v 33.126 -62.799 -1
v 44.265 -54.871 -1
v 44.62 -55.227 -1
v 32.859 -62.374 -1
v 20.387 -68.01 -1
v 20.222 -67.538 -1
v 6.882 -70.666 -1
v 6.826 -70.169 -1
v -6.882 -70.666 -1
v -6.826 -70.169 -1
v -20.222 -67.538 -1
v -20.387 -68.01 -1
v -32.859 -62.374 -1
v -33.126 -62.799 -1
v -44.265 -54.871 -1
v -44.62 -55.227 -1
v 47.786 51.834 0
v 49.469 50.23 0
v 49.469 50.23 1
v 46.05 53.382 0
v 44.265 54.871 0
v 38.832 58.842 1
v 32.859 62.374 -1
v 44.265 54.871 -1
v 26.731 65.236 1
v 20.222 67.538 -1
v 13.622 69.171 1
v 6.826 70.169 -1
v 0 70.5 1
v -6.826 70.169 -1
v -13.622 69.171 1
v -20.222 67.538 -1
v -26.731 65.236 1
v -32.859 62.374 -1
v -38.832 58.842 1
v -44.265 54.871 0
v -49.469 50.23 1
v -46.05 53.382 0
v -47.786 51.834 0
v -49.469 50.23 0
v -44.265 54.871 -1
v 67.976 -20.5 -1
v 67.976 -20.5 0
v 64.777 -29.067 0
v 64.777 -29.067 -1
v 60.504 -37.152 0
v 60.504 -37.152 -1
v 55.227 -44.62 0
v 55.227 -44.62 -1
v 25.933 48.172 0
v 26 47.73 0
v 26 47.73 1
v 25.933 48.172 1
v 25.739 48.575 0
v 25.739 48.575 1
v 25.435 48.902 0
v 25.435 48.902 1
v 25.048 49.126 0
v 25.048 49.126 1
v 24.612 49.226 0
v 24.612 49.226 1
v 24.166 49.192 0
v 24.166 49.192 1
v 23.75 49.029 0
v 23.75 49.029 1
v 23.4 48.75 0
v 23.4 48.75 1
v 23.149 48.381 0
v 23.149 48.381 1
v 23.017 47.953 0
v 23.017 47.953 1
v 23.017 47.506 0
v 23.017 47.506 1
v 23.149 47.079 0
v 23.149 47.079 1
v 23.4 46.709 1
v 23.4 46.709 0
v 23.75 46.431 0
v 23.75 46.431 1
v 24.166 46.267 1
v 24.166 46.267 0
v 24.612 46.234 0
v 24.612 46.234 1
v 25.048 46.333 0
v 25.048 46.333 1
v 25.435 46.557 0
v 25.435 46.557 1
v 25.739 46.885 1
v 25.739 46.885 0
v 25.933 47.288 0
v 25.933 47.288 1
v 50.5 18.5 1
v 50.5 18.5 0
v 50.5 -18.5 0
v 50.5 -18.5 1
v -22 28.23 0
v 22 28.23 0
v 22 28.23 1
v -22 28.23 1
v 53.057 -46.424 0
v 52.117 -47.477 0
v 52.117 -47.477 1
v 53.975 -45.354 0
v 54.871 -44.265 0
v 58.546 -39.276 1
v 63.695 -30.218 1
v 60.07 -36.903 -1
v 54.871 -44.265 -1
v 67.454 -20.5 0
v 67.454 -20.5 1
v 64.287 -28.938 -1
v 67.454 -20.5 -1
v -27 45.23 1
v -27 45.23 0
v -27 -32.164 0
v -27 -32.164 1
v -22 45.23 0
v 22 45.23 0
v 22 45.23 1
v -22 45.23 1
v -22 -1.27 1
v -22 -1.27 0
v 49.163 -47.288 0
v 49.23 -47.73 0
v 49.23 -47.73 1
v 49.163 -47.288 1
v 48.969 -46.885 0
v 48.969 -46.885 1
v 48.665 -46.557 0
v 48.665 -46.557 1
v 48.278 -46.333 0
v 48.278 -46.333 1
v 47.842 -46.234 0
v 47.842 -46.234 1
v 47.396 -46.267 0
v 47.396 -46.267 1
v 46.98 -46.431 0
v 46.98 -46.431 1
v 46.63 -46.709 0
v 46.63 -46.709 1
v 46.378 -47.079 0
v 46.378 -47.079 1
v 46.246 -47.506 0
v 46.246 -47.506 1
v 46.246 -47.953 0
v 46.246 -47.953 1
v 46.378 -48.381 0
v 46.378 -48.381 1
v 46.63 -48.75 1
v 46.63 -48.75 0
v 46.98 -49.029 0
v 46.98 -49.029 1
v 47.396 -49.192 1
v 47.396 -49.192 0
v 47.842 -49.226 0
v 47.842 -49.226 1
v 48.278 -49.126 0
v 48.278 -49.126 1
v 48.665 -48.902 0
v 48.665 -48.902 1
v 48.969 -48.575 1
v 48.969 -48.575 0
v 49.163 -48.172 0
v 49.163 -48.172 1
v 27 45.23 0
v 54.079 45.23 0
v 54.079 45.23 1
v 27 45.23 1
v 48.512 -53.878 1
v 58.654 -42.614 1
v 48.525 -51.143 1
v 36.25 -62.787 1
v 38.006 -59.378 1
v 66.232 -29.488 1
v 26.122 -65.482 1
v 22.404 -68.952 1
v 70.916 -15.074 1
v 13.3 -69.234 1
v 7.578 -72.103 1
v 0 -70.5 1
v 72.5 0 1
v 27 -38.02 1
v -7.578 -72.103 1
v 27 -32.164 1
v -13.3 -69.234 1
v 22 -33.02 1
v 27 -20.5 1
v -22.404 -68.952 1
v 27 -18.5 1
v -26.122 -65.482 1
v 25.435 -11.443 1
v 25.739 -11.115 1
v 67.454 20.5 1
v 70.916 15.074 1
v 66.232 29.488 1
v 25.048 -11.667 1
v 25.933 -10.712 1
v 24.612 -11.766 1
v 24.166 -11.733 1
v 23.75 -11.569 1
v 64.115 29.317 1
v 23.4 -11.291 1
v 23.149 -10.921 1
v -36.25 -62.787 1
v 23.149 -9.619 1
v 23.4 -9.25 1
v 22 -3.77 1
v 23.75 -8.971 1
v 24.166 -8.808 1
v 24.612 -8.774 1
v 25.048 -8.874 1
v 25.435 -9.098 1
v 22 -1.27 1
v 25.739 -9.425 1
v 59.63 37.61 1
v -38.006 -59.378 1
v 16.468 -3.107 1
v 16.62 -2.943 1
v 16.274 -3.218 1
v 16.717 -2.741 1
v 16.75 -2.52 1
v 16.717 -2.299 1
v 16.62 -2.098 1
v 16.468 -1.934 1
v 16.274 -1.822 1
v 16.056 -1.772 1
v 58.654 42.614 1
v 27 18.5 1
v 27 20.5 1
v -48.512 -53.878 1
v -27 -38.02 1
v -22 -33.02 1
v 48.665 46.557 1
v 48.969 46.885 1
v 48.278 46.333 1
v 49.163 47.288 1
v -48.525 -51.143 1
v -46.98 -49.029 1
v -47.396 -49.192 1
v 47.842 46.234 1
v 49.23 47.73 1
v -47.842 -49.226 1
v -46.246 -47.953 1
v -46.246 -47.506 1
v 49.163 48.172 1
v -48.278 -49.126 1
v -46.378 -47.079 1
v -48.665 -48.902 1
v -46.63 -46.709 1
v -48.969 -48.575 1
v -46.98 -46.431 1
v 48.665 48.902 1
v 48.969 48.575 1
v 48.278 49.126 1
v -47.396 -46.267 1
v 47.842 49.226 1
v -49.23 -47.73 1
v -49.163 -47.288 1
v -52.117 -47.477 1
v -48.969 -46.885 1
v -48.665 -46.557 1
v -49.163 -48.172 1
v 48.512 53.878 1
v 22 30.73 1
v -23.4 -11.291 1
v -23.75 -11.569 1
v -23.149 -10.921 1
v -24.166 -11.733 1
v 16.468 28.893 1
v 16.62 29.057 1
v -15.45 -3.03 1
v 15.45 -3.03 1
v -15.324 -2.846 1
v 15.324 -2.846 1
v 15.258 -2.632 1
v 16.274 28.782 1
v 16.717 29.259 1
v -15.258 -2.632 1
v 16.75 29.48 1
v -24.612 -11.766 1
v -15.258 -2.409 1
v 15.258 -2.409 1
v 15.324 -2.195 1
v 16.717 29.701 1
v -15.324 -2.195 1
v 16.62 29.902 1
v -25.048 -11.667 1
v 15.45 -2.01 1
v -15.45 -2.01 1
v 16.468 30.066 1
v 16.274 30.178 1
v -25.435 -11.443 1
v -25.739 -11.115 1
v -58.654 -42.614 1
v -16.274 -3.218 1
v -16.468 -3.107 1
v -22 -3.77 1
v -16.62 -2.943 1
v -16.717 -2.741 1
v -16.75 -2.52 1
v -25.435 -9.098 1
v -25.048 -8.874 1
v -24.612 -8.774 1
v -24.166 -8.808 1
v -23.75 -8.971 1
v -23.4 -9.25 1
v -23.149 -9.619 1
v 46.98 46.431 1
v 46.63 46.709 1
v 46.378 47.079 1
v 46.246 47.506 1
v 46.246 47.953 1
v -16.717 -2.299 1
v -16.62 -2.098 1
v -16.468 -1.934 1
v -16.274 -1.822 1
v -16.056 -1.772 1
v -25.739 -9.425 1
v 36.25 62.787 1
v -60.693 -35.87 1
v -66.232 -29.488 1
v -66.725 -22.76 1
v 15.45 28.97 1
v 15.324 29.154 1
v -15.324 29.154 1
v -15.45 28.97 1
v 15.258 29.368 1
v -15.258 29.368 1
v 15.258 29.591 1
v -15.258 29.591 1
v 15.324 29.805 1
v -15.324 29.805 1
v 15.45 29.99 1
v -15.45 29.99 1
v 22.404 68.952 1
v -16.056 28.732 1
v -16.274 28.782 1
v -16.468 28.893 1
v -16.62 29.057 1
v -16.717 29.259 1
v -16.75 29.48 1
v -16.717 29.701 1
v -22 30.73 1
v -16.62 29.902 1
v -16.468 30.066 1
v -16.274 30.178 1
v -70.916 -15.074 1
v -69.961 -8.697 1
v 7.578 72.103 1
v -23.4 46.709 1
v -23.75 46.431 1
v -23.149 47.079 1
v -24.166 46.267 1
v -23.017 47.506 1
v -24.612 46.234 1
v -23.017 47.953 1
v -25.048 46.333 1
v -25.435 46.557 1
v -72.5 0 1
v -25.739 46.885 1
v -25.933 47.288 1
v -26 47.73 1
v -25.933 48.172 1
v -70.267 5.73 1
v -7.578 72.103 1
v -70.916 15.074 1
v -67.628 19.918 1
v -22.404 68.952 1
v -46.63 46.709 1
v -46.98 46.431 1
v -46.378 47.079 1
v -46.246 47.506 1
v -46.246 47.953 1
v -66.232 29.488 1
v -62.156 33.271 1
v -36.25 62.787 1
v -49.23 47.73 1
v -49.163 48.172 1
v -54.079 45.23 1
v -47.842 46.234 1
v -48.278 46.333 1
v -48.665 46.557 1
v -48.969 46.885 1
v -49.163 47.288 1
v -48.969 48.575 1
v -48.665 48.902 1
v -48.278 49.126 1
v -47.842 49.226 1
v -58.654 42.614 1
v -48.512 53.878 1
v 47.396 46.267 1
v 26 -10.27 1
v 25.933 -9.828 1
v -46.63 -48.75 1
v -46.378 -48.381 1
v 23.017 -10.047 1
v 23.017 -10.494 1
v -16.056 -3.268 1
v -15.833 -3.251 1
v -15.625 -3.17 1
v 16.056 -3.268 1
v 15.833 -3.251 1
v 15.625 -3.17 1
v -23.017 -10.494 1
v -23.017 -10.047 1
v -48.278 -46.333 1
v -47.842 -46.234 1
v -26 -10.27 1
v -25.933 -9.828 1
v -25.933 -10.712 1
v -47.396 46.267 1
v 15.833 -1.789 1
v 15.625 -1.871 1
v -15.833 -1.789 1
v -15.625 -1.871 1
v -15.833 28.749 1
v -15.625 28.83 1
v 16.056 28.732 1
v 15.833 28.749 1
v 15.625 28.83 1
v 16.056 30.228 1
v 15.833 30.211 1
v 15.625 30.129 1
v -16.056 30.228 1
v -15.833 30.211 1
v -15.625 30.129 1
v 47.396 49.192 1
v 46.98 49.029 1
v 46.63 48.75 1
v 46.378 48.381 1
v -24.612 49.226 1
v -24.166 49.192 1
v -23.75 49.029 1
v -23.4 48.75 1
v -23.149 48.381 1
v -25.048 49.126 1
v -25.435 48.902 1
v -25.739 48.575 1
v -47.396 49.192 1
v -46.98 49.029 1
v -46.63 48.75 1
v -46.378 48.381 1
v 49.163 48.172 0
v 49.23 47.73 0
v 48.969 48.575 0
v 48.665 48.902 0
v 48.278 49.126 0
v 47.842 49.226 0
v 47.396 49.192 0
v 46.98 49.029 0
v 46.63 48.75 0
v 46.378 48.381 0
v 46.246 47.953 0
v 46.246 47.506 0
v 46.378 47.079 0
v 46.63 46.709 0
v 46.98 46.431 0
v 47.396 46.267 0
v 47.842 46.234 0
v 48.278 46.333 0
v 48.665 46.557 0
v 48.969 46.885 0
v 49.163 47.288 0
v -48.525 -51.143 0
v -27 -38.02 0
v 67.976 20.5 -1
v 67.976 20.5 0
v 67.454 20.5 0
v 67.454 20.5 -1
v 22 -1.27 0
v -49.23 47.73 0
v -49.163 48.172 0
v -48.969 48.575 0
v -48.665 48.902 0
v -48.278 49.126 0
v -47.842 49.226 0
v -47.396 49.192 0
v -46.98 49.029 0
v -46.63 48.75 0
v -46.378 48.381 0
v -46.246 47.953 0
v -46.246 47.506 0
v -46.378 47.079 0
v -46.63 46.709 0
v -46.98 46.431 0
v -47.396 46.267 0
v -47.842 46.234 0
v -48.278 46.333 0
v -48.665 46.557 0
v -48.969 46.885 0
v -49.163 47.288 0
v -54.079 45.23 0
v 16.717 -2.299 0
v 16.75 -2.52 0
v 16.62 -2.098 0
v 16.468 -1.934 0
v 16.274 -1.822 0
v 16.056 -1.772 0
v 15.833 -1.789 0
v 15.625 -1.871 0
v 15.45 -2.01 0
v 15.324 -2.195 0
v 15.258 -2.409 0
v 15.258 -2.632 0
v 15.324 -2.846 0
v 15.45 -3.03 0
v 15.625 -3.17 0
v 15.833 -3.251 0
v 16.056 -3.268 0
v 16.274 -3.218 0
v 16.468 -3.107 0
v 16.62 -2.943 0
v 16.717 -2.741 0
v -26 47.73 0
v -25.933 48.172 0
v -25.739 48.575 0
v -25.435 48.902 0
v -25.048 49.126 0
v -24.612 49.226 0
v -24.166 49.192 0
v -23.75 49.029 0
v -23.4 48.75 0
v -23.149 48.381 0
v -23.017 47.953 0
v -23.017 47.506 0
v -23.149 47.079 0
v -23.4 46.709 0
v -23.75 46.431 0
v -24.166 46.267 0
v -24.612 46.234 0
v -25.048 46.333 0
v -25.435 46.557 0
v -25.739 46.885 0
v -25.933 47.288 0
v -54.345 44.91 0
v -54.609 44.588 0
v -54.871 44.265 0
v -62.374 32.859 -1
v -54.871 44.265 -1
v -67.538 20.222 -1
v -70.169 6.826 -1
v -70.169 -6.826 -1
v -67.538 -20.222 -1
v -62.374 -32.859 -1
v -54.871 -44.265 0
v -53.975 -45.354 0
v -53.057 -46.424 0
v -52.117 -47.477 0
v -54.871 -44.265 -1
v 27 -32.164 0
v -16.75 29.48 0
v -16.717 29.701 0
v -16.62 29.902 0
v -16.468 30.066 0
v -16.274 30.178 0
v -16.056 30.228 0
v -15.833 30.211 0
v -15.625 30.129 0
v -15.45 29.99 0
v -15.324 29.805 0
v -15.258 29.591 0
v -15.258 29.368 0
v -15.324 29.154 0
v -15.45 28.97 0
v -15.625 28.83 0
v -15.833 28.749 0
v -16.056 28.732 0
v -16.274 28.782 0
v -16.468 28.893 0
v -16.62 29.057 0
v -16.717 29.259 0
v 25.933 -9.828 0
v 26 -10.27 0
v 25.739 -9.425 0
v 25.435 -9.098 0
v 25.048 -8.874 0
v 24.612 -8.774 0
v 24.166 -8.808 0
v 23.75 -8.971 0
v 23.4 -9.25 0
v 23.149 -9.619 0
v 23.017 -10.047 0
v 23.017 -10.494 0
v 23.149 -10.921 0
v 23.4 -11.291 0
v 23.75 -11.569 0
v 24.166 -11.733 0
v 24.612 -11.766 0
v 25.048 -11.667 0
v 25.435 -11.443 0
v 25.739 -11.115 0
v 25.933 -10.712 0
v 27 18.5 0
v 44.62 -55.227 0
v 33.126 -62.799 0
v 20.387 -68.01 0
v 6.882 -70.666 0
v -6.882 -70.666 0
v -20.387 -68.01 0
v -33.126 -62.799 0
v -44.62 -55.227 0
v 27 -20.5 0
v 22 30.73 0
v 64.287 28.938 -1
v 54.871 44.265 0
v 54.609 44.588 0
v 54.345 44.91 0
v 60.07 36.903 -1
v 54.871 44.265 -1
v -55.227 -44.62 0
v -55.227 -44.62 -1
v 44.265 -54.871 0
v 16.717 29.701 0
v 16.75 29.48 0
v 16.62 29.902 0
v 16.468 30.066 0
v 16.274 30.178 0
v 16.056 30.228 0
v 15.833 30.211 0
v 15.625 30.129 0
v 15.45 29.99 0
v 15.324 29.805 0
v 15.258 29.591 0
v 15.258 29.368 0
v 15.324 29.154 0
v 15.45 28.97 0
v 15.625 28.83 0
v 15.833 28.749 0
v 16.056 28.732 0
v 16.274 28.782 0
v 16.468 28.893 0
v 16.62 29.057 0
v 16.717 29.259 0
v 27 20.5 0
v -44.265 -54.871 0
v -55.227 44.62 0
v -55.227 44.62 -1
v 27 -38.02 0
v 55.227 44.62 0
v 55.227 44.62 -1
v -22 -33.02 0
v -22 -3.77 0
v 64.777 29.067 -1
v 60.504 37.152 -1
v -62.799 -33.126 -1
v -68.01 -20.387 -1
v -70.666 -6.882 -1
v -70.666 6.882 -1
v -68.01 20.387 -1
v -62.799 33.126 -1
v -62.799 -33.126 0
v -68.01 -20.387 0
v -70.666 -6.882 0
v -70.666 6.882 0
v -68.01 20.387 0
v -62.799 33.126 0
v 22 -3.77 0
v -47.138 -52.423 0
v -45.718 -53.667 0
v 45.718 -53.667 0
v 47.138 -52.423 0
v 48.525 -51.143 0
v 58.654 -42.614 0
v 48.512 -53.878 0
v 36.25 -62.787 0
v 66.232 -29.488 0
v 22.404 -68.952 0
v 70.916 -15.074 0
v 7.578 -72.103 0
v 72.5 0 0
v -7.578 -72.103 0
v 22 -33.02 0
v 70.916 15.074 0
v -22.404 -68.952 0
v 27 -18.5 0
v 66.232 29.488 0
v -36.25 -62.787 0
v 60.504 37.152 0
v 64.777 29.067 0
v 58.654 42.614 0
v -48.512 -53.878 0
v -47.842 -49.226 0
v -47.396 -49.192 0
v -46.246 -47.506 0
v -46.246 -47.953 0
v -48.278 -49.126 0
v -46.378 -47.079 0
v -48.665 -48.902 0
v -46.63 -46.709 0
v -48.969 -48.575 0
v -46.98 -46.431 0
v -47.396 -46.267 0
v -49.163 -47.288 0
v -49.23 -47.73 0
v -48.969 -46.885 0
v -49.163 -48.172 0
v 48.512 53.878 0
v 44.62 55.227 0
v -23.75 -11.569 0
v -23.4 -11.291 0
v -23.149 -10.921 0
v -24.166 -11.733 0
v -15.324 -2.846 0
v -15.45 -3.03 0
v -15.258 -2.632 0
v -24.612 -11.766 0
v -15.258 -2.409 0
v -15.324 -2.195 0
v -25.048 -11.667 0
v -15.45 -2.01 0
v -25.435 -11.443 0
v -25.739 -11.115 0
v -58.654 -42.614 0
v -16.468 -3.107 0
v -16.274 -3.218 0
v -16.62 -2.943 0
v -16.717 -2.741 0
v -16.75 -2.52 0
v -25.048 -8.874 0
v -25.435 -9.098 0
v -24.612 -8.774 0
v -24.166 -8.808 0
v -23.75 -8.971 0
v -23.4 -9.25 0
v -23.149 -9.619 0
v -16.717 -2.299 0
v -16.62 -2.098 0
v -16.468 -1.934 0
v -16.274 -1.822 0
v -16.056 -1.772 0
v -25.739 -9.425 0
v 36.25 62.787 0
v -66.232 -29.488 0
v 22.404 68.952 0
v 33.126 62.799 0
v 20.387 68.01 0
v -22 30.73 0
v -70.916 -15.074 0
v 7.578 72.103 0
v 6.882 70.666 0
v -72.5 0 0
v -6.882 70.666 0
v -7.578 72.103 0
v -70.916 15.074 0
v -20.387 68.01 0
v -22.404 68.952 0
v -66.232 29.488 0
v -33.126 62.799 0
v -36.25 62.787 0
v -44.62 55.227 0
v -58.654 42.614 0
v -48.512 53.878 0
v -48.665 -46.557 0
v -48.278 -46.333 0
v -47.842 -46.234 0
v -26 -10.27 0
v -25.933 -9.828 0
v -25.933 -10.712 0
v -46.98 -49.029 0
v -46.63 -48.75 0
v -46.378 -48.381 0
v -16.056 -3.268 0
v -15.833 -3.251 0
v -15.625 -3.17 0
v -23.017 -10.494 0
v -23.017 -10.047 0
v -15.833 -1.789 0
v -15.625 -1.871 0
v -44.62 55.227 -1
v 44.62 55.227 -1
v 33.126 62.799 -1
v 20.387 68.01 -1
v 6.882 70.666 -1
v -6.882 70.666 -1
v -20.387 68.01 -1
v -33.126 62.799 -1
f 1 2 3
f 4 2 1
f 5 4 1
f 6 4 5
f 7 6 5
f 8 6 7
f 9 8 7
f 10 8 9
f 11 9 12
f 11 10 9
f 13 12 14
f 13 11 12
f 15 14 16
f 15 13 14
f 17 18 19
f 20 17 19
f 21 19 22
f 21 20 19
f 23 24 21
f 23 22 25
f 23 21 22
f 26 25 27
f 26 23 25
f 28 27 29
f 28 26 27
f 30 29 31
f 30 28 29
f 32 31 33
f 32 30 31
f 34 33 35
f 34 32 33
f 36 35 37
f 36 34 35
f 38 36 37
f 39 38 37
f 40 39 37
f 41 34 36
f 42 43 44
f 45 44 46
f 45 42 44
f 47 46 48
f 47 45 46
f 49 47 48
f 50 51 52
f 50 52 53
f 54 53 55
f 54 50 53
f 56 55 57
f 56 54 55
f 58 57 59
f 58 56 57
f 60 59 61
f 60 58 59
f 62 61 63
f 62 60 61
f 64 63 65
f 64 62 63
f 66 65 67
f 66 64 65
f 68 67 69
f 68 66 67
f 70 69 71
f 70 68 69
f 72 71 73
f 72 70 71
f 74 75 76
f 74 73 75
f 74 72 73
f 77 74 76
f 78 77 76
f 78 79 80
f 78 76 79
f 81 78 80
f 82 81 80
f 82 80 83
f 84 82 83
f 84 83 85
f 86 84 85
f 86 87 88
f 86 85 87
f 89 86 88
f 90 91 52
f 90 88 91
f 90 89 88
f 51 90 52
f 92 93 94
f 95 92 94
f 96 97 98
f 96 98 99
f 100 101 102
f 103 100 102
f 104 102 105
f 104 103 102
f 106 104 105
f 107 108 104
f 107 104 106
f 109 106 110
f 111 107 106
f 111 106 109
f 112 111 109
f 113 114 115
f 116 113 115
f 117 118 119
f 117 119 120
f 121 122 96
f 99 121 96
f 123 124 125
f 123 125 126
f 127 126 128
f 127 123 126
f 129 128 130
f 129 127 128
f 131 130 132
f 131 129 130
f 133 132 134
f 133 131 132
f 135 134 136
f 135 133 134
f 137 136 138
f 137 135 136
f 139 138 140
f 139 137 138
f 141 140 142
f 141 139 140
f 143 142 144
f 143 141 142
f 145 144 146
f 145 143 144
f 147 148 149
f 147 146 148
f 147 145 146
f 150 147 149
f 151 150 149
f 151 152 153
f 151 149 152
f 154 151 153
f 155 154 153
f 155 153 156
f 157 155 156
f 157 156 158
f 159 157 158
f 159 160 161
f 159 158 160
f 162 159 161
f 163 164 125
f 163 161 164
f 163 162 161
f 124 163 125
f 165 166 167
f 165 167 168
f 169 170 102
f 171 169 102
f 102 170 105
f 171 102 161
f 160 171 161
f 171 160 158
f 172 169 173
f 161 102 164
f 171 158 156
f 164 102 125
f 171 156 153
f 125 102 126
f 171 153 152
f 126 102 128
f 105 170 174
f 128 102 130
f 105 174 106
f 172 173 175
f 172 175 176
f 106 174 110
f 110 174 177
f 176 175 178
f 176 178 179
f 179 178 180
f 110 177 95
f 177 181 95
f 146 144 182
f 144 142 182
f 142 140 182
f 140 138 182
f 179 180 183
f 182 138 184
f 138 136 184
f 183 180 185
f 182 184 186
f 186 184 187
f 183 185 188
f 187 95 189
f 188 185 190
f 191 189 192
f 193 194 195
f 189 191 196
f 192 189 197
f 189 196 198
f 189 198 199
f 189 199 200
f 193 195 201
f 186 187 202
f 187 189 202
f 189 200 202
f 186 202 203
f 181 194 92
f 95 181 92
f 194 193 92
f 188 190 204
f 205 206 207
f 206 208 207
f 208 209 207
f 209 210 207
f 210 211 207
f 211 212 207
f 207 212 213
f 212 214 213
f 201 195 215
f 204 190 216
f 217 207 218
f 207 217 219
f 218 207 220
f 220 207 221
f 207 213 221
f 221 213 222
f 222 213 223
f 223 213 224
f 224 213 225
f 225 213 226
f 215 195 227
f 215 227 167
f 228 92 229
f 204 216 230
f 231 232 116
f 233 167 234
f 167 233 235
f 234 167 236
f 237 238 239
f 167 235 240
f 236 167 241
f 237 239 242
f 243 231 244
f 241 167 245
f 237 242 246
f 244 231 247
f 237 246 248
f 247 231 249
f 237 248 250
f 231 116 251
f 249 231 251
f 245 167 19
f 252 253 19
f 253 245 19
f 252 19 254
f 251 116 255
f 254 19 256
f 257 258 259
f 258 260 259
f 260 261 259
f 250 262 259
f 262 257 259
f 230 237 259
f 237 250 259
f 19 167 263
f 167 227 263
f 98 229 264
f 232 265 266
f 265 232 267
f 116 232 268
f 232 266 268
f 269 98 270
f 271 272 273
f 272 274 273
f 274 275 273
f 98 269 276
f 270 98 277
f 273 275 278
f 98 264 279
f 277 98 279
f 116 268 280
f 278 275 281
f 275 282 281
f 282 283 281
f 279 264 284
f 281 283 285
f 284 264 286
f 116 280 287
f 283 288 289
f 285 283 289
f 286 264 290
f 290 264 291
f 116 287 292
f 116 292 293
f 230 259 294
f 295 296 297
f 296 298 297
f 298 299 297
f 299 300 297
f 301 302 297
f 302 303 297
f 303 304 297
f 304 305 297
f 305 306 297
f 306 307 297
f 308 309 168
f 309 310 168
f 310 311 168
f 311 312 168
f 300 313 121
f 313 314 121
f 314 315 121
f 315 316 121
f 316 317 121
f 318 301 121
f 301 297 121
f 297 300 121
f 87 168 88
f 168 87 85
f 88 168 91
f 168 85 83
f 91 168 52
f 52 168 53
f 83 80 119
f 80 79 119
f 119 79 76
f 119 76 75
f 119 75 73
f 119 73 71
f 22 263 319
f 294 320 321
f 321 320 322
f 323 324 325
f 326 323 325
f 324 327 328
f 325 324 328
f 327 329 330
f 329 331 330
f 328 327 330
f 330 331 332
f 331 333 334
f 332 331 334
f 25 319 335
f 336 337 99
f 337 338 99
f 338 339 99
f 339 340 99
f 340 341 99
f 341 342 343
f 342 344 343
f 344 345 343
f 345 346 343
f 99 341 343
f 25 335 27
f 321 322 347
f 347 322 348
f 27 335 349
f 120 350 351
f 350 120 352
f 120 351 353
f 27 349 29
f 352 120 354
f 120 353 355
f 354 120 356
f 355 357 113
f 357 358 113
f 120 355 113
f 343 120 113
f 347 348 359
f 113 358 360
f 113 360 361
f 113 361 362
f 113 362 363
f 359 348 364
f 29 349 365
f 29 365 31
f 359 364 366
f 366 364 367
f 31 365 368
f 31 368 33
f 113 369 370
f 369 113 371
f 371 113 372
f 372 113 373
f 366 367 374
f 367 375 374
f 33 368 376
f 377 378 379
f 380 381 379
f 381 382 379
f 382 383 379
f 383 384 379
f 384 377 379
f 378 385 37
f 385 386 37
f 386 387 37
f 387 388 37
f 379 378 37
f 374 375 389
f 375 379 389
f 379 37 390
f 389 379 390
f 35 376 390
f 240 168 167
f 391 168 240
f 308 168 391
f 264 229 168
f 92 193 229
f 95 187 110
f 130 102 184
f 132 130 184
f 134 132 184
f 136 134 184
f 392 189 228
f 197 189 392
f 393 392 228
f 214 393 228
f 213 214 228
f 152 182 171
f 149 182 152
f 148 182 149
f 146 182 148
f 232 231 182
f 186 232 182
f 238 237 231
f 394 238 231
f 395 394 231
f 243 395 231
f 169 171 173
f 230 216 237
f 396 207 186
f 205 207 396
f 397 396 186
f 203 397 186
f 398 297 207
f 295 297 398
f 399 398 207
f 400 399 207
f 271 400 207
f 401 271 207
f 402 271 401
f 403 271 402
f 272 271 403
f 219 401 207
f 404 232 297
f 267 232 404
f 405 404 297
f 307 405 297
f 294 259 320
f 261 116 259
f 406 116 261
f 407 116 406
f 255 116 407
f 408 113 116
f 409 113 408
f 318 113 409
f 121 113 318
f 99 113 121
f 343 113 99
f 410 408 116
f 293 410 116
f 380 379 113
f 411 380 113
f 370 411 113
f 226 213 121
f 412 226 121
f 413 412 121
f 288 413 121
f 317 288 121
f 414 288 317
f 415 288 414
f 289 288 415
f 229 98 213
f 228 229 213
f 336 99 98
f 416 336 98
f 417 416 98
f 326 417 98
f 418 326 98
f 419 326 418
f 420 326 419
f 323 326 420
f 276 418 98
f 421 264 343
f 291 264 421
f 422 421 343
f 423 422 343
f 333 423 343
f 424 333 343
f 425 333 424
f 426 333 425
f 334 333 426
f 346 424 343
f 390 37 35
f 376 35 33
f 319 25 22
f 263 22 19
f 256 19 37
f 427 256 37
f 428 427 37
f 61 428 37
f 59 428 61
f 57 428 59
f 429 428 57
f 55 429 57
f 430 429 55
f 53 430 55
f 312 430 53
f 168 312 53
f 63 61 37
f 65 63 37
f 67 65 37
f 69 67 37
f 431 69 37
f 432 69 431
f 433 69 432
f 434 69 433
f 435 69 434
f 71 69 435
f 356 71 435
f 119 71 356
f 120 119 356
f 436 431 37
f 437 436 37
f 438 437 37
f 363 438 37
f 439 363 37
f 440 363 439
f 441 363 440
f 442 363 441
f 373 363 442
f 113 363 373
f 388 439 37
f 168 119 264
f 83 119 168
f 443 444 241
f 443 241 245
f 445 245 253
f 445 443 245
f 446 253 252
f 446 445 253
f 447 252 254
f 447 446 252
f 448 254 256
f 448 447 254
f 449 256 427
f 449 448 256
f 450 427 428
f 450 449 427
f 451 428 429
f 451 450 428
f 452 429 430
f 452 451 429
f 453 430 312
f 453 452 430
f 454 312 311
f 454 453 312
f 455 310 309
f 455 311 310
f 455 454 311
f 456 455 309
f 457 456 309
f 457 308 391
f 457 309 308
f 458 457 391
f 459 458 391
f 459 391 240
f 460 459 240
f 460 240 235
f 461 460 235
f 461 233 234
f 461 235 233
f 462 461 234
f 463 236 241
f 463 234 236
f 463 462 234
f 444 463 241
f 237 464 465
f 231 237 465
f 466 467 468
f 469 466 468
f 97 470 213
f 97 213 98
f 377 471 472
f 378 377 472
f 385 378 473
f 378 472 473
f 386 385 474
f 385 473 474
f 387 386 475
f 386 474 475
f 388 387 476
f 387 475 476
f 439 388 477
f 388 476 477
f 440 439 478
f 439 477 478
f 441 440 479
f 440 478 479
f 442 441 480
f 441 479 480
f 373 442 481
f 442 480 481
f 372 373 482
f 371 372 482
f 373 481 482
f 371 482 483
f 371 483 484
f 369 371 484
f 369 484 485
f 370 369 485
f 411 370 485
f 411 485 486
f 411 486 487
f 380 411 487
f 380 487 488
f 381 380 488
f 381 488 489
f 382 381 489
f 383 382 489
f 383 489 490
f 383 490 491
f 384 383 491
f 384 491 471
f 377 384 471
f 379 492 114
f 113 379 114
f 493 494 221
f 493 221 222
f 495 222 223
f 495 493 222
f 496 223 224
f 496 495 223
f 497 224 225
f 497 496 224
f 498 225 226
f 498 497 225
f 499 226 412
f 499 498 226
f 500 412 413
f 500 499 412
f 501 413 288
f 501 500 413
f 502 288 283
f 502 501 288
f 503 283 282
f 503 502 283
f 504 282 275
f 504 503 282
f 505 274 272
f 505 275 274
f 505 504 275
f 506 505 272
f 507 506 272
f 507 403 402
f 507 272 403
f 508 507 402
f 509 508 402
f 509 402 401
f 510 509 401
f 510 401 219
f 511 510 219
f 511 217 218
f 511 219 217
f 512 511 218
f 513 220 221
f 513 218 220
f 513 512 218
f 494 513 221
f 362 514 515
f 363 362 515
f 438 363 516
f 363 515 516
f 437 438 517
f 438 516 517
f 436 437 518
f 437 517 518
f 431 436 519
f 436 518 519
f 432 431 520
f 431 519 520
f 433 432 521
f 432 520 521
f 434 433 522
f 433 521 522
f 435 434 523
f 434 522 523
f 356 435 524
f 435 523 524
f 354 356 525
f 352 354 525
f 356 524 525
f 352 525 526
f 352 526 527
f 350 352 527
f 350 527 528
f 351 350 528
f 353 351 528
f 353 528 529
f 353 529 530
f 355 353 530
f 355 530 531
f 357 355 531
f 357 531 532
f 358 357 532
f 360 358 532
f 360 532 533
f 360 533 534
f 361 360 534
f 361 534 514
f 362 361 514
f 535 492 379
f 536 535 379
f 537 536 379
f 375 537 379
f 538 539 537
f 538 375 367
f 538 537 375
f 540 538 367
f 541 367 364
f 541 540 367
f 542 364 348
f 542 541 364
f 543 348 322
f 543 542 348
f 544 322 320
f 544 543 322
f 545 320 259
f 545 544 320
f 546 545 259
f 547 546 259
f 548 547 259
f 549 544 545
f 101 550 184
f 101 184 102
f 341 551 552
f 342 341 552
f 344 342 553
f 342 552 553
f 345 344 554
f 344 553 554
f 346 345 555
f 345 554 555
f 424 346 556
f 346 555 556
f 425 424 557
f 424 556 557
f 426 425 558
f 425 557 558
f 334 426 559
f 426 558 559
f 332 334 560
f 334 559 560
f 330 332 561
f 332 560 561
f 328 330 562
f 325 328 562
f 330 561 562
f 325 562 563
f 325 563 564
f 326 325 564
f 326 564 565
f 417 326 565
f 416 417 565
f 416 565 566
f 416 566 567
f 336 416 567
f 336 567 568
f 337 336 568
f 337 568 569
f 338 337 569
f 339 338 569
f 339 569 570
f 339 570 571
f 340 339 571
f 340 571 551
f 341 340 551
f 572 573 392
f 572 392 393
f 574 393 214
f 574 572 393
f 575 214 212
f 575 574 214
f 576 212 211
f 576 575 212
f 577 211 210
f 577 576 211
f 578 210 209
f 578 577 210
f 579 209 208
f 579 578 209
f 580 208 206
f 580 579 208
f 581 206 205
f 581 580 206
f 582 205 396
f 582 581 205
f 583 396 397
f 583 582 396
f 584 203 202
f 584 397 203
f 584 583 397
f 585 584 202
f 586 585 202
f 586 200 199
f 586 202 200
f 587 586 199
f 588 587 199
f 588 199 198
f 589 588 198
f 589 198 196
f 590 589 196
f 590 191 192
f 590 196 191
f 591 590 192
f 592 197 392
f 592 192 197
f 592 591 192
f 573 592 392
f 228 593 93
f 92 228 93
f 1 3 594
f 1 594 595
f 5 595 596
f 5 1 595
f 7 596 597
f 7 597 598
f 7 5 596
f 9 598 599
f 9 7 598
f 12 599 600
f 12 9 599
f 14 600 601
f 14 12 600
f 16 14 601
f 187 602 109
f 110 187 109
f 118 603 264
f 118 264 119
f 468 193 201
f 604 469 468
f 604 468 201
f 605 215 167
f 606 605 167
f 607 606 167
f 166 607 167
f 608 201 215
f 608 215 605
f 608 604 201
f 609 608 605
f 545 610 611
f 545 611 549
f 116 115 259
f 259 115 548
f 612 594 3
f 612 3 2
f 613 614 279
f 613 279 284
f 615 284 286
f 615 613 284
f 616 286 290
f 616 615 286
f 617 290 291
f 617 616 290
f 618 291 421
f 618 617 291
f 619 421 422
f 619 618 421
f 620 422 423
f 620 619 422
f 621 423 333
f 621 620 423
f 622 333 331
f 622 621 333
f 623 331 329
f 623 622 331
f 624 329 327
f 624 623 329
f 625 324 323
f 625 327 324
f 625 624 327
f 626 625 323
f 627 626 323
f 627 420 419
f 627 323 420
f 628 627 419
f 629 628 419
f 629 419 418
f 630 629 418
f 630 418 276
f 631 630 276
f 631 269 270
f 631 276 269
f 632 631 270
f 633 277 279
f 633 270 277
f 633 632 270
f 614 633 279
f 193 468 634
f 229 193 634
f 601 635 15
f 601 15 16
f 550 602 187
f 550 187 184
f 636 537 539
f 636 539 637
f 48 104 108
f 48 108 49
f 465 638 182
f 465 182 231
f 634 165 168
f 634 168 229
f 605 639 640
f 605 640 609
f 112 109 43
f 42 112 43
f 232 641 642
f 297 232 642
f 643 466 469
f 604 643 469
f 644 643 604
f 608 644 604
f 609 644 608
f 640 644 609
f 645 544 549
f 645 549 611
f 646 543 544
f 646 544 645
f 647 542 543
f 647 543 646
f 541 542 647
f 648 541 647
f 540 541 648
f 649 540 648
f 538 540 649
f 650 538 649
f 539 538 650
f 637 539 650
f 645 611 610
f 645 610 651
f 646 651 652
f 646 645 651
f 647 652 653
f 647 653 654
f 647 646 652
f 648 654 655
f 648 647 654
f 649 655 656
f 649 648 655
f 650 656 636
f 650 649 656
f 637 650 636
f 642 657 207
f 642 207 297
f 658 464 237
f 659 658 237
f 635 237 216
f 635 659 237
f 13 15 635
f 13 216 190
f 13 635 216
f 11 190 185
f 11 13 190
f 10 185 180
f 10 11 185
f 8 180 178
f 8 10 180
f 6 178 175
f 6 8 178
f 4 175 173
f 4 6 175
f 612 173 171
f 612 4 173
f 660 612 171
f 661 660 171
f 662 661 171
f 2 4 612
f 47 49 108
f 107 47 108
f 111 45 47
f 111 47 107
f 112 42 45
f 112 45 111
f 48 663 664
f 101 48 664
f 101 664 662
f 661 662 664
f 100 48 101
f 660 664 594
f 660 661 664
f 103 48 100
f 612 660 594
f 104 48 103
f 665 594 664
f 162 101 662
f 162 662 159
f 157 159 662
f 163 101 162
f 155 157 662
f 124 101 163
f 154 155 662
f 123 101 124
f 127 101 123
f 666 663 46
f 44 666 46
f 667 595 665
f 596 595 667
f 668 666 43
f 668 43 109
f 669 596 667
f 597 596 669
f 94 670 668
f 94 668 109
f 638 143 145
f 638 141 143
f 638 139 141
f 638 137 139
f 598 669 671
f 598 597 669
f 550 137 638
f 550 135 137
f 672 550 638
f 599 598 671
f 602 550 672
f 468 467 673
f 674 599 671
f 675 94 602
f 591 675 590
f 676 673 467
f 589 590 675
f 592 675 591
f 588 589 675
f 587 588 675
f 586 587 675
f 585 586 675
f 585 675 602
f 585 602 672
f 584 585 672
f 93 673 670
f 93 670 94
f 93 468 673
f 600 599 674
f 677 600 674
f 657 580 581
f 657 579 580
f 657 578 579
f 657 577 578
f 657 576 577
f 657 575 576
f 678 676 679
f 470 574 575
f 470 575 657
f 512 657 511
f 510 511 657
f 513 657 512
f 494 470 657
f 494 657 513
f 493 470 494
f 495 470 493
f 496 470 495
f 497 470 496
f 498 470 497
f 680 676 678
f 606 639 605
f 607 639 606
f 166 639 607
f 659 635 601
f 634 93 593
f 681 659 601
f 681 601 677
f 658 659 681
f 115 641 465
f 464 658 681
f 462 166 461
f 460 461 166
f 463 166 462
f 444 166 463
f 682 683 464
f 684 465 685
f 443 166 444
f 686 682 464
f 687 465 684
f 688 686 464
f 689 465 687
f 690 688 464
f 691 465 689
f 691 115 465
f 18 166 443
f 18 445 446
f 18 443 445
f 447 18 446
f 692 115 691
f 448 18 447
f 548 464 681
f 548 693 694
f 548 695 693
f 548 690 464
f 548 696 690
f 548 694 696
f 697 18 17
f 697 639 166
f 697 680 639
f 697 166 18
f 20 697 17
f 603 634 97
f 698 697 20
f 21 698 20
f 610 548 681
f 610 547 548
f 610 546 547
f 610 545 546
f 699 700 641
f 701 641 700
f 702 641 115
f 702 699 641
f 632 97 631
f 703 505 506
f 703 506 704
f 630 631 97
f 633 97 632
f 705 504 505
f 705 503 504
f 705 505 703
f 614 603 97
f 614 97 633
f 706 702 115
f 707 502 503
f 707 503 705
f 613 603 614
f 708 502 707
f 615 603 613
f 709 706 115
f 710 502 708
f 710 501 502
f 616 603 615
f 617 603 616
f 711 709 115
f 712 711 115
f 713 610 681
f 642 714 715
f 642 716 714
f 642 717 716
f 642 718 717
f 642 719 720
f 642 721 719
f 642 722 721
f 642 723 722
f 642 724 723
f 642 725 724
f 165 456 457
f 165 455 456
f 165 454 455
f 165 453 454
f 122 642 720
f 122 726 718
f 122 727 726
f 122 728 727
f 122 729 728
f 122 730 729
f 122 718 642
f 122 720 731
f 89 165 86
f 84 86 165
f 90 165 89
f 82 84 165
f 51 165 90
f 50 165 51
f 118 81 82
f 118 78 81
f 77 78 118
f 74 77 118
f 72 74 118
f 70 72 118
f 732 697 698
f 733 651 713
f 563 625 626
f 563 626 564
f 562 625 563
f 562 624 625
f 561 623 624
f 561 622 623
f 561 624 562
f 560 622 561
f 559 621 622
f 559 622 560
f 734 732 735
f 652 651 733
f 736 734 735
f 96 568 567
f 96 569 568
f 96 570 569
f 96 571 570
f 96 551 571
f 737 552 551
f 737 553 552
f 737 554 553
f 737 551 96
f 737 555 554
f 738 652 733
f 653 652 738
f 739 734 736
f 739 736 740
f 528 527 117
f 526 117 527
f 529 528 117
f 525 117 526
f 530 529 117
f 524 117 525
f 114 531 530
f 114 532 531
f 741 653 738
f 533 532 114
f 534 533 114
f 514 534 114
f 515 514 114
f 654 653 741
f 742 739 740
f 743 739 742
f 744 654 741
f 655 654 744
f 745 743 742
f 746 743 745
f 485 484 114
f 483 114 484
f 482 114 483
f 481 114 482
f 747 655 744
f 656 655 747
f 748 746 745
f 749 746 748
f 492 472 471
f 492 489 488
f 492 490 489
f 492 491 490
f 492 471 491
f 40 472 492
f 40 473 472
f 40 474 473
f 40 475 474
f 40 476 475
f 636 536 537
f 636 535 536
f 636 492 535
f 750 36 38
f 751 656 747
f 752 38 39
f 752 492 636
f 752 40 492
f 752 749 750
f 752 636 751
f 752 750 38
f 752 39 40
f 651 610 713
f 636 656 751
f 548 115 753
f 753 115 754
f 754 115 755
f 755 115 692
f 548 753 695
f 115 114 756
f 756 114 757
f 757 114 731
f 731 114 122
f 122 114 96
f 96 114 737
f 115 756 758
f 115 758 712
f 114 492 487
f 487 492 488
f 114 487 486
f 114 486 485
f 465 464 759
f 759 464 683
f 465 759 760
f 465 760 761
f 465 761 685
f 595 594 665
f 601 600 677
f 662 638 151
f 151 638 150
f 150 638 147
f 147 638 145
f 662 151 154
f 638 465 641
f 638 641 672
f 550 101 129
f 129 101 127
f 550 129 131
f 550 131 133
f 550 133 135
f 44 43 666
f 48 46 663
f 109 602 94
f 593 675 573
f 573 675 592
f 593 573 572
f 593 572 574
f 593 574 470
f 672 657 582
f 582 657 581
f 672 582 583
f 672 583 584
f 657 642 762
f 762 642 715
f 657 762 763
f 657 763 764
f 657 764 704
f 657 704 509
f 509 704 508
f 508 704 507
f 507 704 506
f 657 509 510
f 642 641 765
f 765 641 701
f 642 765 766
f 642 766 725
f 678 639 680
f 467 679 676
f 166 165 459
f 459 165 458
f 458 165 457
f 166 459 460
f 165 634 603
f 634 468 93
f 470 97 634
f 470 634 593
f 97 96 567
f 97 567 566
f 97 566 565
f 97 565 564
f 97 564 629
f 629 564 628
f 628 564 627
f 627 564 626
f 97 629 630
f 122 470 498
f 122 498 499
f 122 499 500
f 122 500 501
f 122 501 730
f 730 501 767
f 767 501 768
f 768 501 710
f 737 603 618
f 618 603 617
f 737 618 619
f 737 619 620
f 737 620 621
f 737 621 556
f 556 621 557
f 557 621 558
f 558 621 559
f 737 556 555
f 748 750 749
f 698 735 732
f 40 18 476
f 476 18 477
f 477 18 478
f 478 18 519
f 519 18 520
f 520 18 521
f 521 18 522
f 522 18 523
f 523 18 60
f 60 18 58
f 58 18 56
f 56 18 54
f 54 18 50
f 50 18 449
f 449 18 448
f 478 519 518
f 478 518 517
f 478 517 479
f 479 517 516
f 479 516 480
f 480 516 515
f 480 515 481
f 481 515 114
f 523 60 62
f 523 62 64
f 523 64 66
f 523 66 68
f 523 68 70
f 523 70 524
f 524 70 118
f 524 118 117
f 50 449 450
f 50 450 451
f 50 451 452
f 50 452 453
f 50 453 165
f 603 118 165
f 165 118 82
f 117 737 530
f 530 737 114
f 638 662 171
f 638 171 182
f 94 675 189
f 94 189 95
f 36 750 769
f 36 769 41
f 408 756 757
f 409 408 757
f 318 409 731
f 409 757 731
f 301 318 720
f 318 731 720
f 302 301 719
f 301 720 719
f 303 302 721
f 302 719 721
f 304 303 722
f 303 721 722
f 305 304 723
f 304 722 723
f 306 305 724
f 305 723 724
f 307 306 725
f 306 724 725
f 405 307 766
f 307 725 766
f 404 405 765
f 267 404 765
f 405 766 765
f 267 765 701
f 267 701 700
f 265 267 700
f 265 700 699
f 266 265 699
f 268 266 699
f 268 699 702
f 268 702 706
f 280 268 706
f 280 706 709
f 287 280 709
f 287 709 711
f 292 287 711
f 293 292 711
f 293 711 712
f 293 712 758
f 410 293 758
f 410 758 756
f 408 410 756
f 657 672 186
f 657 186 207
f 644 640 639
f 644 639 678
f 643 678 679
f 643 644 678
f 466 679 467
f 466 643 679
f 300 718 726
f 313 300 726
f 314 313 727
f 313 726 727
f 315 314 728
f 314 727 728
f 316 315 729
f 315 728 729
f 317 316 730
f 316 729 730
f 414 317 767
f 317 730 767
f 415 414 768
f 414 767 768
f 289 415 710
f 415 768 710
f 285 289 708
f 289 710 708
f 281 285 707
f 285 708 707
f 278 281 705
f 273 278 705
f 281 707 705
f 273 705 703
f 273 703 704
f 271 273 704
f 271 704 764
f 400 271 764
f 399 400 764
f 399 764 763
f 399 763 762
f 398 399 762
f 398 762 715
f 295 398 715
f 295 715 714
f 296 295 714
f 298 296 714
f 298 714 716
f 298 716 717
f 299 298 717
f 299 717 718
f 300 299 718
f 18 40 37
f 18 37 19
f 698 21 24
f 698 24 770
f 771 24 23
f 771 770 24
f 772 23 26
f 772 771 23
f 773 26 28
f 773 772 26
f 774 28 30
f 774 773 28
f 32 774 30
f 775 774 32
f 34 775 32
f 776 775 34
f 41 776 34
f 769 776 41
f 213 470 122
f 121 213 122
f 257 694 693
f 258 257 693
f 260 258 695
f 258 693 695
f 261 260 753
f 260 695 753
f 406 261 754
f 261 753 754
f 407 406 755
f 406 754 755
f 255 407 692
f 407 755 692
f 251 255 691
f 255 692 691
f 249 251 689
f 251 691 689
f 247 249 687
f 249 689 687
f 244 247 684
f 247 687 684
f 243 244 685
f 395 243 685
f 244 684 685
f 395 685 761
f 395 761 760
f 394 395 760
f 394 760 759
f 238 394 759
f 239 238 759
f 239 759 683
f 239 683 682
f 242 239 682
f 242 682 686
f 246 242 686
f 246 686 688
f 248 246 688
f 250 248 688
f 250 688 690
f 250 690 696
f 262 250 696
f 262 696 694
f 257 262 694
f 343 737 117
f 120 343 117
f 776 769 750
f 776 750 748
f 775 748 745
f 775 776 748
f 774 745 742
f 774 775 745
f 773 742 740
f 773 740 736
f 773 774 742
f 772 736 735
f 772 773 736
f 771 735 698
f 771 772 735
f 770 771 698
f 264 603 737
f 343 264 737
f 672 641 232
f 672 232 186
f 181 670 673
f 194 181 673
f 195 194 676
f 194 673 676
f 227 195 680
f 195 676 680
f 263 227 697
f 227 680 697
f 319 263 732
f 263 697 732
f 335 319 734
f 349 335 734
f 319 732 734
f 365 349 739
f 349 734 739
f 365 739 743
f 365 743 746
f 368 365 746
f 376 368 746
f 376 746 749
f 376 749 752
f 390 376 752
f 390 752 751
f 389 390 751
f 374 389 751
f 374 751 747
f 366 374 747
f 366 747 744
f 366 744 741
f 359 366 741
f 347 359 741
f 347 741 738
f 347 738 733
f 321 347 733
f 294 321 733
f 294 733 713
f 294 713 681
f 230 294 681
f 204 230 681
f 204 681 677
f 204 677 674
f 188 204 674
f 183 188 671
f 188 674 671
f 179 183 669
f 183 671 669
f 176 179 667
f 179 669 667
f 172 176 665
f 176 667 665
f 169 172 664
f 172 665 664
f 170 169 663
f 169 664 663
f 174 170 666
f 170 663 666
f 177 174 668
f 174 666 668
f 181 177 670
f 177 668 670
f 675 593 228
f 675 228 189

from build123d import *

# Parameters (mm, degrees)
SKIZZE1_R                = 72.5
SKIZZE1_R_2              = 70.5
BASE_RING_DEPTH          = 1
SKIZZE2_W                = 22
SKIZZE2_H                = 2.5
RASPBERRY_FRAME_DEPTH    = 1
SCREWS_I_D               = 3
FAN_SCREWS_D             = 1.5
TOP_START                = -1
SKIZZE7_W                = 23.5
SKIZZE7_H                = 2
TOP_COVER_DEPTH          = 1
INNER_START              = 1
INNER_RING_DEPTH         = 1
LOWER_COVER_CUT_DEPTH    = 103.535359755
COVER_CUT_ROTATION_COUNT = 4


with BuildPart() as part:
    # Skizze1 → Base Ring (new body)
    with BuildSketch(Plane.XY):
        Circle(SKIZZE1_R)
        Circle(SKIZZE1_R_2, mode=Mode.SUBTRACT)
    extrude(amount=BASE_RING_DEPTH)

    # Skizze2 → Raspberry Frame (add)
    with BuildSketch(Plane.XY):
        with BuildLine():
            Line((0, 50.22970773), (-49.469449778, 50.22970773))
            ThreePointArc((-49.469449778, 50.22970773), (-51.834480078, 47.785318614), (-54.078864066, 45.22970773))
            Line((-54.078864066, 45.22970773), (-27, 45.22970773))
            Line((-27, 45.22970773), (-22, 45.22970773))
            Line((-22, 45.22970773), (0, 45.22970773))
            Line((0, 45.22970773), (0, 50.22970773))
        make_face()
        Polygon((-22, 45.22970773), (-27, 45.22970773), (-27, -32.164435383), (-27, -33.02029227), (-22, -33.02029227), (-22, -3.77029227), (-22, -1.27029227), (-22, 28.22970773), (-22, 30.72970773), align=None)
        with BuildLine():
            Line((-27, -32.164435383), (-52.117379441, -47.476612771))
            ThreePointArc((-52.117379441, -47.476612771), (-50.354632641, -49.34228381), (-48.5251414, -51.142552264))
            Line((-48.5251414, -51.142552264), (-27, -38.02029227))
            Line((-27, -38.02029227), (-27, -33.02029227))
            Line((-27, -33.02029227), (-27, -32.164435383))
        make_face()
        Polygon((-27, -33.02029227), (-27, -38.02029227), (0, -38.02029227), (0, -33.02029227), (-22, -33.02029227), align=None)
        with Locations((-11, 29.47970773)):
            Rectangle(SKIZZE2_W, SKIZZE2_H)
        with Locations((-11, -2.52029227)):
            Rectangle(SKIZZE2_W, SKIZZE2_H)
    raspberry_frame = extrude(amount=RASPBERRY_FRAME_DEPTH)

    # Screws I (through all)
    with Locations(Plane.XY.offset(1)):
        with Locations((-47.72970773, -47.72970773), (-24.5, -10.27029227), (-47.72970773, 47.72970773), (-24.5, 47.72970773)):
            screws_i = Hole(SCREWS_I_D / 2)

    # Fan Screws (through all)
    with Locations(Plane.XY.offset(1)):
        with Locations((-16, 29.47970773), (-16, -2.52029227)):
            fan_screws = Hole(FAN_SCREWS_D / 2)

    # Mirror I: Raspberry Frame, Screws I, Fan Screws across plane
    add(raspberry_frame.mirror(Plane(origin=(0, 0, 0), x_dir=(0, 0, 1), z_dir=(1, 0, 0))))
    add(screws_i.mirror(Plane(origin=(0, 0, 0), x_dir=(0, 0, 1), z_dir=(1, 0, 0))), mode=Mode.SUBTRACT)
    add(fan_screws.mirror(Plane(origin=(0, 0, 0), x_dir=(0, 0, 1), z_dir=(1, 0, 0))), mode=Mode.SUBTRACT)

    # Skizze7 → Top Cover (add)
    with BuildSketch(Plane.XY.offset(1).offset(TOP_START)):
        with BuildLine():
            Line((50.5, -18.5), (50.5, -20.5))
            Line((50.5, -20.5), (67.453687816, -20.5))
            ThreePointArc((67.453687816, -20.5), (69.734263426, -10.36255299), (70.5, 0))
            ThreePointArc((70.5, 0), (69.734263426, 10.36255299), (67.453687816, 20.5))
            Line((67.453687816, 20.5), (50.5, 20.5))
            Line((50.5, 20.5), (50.5, 18.5))
            Line((50.5, 18.5), (50.5, -18.5))
        make_face()
        with Locations((38.75, 19.5)):
            Rectangle(SKIZZE7_W, SKIZZE7_H)
        with Locations((38.75, -19.5)):
            Rectangle(SKIZZE7_W, SKIZZE7_H)
    extrude(amount=TOP_COVER_DEPTH)

    # Skizze8 → Inner Ring (add)
    with BuildSketch(Plane(origin=(0, 0, 0), x_dir=(-1, 0, 0), z_dir=(0, 0, -1)).offset(INNER_START)):
        with BuildLine():
            Line((-67.976098741, 20.5), (-67.453687816, 20.5))
            ThreePointArc((-67.453687816, 20.5), (70.5, 0), (-67.453687816, -20.5))
            Line((-67.453687816, -20.5), (-67.976098741, -20.5))
            ThreePointArc((-67.976098741, -20.5), (71, 0), (-67.976098741, 20.5))
        make_face()
    extrude(amount=-INNER_RING_DEPTH)

    # Skizze9 → Lower Cover Cut (cut, through all)
    with BuildSketch(Plane(origin=(0, 0, 0), x_dir=(-1, 0, 0), z_dir=(0, 0, -1))):
        Polygon((-45.961940777, -56.568542495), (-38.890872965, -49.497474683), (-49.497474683, -38.890872965), (-56.568542495, -45.961940777), align=None)
    lower_cover_cut = extrude(amount=LOWER_COVER_CUT_DEPTH, mode=Mode.SUBTRACT)

    # Cover Cut Rotation: Lower Cover Cut ×4 about axis
    cover_cut_rotation_axis = Axis((0, 0, 0), (0, 0, 1))
    for i in range(1, COVER_CUT_ROTATION_COUNT):
        add(lower_cover_cut.rotate(cover_cut_rotation_axis, i * 360 / COVER_CUT_ROTATION_COUNT), mode=Mode.SUBTRACT)


solid = part.part
